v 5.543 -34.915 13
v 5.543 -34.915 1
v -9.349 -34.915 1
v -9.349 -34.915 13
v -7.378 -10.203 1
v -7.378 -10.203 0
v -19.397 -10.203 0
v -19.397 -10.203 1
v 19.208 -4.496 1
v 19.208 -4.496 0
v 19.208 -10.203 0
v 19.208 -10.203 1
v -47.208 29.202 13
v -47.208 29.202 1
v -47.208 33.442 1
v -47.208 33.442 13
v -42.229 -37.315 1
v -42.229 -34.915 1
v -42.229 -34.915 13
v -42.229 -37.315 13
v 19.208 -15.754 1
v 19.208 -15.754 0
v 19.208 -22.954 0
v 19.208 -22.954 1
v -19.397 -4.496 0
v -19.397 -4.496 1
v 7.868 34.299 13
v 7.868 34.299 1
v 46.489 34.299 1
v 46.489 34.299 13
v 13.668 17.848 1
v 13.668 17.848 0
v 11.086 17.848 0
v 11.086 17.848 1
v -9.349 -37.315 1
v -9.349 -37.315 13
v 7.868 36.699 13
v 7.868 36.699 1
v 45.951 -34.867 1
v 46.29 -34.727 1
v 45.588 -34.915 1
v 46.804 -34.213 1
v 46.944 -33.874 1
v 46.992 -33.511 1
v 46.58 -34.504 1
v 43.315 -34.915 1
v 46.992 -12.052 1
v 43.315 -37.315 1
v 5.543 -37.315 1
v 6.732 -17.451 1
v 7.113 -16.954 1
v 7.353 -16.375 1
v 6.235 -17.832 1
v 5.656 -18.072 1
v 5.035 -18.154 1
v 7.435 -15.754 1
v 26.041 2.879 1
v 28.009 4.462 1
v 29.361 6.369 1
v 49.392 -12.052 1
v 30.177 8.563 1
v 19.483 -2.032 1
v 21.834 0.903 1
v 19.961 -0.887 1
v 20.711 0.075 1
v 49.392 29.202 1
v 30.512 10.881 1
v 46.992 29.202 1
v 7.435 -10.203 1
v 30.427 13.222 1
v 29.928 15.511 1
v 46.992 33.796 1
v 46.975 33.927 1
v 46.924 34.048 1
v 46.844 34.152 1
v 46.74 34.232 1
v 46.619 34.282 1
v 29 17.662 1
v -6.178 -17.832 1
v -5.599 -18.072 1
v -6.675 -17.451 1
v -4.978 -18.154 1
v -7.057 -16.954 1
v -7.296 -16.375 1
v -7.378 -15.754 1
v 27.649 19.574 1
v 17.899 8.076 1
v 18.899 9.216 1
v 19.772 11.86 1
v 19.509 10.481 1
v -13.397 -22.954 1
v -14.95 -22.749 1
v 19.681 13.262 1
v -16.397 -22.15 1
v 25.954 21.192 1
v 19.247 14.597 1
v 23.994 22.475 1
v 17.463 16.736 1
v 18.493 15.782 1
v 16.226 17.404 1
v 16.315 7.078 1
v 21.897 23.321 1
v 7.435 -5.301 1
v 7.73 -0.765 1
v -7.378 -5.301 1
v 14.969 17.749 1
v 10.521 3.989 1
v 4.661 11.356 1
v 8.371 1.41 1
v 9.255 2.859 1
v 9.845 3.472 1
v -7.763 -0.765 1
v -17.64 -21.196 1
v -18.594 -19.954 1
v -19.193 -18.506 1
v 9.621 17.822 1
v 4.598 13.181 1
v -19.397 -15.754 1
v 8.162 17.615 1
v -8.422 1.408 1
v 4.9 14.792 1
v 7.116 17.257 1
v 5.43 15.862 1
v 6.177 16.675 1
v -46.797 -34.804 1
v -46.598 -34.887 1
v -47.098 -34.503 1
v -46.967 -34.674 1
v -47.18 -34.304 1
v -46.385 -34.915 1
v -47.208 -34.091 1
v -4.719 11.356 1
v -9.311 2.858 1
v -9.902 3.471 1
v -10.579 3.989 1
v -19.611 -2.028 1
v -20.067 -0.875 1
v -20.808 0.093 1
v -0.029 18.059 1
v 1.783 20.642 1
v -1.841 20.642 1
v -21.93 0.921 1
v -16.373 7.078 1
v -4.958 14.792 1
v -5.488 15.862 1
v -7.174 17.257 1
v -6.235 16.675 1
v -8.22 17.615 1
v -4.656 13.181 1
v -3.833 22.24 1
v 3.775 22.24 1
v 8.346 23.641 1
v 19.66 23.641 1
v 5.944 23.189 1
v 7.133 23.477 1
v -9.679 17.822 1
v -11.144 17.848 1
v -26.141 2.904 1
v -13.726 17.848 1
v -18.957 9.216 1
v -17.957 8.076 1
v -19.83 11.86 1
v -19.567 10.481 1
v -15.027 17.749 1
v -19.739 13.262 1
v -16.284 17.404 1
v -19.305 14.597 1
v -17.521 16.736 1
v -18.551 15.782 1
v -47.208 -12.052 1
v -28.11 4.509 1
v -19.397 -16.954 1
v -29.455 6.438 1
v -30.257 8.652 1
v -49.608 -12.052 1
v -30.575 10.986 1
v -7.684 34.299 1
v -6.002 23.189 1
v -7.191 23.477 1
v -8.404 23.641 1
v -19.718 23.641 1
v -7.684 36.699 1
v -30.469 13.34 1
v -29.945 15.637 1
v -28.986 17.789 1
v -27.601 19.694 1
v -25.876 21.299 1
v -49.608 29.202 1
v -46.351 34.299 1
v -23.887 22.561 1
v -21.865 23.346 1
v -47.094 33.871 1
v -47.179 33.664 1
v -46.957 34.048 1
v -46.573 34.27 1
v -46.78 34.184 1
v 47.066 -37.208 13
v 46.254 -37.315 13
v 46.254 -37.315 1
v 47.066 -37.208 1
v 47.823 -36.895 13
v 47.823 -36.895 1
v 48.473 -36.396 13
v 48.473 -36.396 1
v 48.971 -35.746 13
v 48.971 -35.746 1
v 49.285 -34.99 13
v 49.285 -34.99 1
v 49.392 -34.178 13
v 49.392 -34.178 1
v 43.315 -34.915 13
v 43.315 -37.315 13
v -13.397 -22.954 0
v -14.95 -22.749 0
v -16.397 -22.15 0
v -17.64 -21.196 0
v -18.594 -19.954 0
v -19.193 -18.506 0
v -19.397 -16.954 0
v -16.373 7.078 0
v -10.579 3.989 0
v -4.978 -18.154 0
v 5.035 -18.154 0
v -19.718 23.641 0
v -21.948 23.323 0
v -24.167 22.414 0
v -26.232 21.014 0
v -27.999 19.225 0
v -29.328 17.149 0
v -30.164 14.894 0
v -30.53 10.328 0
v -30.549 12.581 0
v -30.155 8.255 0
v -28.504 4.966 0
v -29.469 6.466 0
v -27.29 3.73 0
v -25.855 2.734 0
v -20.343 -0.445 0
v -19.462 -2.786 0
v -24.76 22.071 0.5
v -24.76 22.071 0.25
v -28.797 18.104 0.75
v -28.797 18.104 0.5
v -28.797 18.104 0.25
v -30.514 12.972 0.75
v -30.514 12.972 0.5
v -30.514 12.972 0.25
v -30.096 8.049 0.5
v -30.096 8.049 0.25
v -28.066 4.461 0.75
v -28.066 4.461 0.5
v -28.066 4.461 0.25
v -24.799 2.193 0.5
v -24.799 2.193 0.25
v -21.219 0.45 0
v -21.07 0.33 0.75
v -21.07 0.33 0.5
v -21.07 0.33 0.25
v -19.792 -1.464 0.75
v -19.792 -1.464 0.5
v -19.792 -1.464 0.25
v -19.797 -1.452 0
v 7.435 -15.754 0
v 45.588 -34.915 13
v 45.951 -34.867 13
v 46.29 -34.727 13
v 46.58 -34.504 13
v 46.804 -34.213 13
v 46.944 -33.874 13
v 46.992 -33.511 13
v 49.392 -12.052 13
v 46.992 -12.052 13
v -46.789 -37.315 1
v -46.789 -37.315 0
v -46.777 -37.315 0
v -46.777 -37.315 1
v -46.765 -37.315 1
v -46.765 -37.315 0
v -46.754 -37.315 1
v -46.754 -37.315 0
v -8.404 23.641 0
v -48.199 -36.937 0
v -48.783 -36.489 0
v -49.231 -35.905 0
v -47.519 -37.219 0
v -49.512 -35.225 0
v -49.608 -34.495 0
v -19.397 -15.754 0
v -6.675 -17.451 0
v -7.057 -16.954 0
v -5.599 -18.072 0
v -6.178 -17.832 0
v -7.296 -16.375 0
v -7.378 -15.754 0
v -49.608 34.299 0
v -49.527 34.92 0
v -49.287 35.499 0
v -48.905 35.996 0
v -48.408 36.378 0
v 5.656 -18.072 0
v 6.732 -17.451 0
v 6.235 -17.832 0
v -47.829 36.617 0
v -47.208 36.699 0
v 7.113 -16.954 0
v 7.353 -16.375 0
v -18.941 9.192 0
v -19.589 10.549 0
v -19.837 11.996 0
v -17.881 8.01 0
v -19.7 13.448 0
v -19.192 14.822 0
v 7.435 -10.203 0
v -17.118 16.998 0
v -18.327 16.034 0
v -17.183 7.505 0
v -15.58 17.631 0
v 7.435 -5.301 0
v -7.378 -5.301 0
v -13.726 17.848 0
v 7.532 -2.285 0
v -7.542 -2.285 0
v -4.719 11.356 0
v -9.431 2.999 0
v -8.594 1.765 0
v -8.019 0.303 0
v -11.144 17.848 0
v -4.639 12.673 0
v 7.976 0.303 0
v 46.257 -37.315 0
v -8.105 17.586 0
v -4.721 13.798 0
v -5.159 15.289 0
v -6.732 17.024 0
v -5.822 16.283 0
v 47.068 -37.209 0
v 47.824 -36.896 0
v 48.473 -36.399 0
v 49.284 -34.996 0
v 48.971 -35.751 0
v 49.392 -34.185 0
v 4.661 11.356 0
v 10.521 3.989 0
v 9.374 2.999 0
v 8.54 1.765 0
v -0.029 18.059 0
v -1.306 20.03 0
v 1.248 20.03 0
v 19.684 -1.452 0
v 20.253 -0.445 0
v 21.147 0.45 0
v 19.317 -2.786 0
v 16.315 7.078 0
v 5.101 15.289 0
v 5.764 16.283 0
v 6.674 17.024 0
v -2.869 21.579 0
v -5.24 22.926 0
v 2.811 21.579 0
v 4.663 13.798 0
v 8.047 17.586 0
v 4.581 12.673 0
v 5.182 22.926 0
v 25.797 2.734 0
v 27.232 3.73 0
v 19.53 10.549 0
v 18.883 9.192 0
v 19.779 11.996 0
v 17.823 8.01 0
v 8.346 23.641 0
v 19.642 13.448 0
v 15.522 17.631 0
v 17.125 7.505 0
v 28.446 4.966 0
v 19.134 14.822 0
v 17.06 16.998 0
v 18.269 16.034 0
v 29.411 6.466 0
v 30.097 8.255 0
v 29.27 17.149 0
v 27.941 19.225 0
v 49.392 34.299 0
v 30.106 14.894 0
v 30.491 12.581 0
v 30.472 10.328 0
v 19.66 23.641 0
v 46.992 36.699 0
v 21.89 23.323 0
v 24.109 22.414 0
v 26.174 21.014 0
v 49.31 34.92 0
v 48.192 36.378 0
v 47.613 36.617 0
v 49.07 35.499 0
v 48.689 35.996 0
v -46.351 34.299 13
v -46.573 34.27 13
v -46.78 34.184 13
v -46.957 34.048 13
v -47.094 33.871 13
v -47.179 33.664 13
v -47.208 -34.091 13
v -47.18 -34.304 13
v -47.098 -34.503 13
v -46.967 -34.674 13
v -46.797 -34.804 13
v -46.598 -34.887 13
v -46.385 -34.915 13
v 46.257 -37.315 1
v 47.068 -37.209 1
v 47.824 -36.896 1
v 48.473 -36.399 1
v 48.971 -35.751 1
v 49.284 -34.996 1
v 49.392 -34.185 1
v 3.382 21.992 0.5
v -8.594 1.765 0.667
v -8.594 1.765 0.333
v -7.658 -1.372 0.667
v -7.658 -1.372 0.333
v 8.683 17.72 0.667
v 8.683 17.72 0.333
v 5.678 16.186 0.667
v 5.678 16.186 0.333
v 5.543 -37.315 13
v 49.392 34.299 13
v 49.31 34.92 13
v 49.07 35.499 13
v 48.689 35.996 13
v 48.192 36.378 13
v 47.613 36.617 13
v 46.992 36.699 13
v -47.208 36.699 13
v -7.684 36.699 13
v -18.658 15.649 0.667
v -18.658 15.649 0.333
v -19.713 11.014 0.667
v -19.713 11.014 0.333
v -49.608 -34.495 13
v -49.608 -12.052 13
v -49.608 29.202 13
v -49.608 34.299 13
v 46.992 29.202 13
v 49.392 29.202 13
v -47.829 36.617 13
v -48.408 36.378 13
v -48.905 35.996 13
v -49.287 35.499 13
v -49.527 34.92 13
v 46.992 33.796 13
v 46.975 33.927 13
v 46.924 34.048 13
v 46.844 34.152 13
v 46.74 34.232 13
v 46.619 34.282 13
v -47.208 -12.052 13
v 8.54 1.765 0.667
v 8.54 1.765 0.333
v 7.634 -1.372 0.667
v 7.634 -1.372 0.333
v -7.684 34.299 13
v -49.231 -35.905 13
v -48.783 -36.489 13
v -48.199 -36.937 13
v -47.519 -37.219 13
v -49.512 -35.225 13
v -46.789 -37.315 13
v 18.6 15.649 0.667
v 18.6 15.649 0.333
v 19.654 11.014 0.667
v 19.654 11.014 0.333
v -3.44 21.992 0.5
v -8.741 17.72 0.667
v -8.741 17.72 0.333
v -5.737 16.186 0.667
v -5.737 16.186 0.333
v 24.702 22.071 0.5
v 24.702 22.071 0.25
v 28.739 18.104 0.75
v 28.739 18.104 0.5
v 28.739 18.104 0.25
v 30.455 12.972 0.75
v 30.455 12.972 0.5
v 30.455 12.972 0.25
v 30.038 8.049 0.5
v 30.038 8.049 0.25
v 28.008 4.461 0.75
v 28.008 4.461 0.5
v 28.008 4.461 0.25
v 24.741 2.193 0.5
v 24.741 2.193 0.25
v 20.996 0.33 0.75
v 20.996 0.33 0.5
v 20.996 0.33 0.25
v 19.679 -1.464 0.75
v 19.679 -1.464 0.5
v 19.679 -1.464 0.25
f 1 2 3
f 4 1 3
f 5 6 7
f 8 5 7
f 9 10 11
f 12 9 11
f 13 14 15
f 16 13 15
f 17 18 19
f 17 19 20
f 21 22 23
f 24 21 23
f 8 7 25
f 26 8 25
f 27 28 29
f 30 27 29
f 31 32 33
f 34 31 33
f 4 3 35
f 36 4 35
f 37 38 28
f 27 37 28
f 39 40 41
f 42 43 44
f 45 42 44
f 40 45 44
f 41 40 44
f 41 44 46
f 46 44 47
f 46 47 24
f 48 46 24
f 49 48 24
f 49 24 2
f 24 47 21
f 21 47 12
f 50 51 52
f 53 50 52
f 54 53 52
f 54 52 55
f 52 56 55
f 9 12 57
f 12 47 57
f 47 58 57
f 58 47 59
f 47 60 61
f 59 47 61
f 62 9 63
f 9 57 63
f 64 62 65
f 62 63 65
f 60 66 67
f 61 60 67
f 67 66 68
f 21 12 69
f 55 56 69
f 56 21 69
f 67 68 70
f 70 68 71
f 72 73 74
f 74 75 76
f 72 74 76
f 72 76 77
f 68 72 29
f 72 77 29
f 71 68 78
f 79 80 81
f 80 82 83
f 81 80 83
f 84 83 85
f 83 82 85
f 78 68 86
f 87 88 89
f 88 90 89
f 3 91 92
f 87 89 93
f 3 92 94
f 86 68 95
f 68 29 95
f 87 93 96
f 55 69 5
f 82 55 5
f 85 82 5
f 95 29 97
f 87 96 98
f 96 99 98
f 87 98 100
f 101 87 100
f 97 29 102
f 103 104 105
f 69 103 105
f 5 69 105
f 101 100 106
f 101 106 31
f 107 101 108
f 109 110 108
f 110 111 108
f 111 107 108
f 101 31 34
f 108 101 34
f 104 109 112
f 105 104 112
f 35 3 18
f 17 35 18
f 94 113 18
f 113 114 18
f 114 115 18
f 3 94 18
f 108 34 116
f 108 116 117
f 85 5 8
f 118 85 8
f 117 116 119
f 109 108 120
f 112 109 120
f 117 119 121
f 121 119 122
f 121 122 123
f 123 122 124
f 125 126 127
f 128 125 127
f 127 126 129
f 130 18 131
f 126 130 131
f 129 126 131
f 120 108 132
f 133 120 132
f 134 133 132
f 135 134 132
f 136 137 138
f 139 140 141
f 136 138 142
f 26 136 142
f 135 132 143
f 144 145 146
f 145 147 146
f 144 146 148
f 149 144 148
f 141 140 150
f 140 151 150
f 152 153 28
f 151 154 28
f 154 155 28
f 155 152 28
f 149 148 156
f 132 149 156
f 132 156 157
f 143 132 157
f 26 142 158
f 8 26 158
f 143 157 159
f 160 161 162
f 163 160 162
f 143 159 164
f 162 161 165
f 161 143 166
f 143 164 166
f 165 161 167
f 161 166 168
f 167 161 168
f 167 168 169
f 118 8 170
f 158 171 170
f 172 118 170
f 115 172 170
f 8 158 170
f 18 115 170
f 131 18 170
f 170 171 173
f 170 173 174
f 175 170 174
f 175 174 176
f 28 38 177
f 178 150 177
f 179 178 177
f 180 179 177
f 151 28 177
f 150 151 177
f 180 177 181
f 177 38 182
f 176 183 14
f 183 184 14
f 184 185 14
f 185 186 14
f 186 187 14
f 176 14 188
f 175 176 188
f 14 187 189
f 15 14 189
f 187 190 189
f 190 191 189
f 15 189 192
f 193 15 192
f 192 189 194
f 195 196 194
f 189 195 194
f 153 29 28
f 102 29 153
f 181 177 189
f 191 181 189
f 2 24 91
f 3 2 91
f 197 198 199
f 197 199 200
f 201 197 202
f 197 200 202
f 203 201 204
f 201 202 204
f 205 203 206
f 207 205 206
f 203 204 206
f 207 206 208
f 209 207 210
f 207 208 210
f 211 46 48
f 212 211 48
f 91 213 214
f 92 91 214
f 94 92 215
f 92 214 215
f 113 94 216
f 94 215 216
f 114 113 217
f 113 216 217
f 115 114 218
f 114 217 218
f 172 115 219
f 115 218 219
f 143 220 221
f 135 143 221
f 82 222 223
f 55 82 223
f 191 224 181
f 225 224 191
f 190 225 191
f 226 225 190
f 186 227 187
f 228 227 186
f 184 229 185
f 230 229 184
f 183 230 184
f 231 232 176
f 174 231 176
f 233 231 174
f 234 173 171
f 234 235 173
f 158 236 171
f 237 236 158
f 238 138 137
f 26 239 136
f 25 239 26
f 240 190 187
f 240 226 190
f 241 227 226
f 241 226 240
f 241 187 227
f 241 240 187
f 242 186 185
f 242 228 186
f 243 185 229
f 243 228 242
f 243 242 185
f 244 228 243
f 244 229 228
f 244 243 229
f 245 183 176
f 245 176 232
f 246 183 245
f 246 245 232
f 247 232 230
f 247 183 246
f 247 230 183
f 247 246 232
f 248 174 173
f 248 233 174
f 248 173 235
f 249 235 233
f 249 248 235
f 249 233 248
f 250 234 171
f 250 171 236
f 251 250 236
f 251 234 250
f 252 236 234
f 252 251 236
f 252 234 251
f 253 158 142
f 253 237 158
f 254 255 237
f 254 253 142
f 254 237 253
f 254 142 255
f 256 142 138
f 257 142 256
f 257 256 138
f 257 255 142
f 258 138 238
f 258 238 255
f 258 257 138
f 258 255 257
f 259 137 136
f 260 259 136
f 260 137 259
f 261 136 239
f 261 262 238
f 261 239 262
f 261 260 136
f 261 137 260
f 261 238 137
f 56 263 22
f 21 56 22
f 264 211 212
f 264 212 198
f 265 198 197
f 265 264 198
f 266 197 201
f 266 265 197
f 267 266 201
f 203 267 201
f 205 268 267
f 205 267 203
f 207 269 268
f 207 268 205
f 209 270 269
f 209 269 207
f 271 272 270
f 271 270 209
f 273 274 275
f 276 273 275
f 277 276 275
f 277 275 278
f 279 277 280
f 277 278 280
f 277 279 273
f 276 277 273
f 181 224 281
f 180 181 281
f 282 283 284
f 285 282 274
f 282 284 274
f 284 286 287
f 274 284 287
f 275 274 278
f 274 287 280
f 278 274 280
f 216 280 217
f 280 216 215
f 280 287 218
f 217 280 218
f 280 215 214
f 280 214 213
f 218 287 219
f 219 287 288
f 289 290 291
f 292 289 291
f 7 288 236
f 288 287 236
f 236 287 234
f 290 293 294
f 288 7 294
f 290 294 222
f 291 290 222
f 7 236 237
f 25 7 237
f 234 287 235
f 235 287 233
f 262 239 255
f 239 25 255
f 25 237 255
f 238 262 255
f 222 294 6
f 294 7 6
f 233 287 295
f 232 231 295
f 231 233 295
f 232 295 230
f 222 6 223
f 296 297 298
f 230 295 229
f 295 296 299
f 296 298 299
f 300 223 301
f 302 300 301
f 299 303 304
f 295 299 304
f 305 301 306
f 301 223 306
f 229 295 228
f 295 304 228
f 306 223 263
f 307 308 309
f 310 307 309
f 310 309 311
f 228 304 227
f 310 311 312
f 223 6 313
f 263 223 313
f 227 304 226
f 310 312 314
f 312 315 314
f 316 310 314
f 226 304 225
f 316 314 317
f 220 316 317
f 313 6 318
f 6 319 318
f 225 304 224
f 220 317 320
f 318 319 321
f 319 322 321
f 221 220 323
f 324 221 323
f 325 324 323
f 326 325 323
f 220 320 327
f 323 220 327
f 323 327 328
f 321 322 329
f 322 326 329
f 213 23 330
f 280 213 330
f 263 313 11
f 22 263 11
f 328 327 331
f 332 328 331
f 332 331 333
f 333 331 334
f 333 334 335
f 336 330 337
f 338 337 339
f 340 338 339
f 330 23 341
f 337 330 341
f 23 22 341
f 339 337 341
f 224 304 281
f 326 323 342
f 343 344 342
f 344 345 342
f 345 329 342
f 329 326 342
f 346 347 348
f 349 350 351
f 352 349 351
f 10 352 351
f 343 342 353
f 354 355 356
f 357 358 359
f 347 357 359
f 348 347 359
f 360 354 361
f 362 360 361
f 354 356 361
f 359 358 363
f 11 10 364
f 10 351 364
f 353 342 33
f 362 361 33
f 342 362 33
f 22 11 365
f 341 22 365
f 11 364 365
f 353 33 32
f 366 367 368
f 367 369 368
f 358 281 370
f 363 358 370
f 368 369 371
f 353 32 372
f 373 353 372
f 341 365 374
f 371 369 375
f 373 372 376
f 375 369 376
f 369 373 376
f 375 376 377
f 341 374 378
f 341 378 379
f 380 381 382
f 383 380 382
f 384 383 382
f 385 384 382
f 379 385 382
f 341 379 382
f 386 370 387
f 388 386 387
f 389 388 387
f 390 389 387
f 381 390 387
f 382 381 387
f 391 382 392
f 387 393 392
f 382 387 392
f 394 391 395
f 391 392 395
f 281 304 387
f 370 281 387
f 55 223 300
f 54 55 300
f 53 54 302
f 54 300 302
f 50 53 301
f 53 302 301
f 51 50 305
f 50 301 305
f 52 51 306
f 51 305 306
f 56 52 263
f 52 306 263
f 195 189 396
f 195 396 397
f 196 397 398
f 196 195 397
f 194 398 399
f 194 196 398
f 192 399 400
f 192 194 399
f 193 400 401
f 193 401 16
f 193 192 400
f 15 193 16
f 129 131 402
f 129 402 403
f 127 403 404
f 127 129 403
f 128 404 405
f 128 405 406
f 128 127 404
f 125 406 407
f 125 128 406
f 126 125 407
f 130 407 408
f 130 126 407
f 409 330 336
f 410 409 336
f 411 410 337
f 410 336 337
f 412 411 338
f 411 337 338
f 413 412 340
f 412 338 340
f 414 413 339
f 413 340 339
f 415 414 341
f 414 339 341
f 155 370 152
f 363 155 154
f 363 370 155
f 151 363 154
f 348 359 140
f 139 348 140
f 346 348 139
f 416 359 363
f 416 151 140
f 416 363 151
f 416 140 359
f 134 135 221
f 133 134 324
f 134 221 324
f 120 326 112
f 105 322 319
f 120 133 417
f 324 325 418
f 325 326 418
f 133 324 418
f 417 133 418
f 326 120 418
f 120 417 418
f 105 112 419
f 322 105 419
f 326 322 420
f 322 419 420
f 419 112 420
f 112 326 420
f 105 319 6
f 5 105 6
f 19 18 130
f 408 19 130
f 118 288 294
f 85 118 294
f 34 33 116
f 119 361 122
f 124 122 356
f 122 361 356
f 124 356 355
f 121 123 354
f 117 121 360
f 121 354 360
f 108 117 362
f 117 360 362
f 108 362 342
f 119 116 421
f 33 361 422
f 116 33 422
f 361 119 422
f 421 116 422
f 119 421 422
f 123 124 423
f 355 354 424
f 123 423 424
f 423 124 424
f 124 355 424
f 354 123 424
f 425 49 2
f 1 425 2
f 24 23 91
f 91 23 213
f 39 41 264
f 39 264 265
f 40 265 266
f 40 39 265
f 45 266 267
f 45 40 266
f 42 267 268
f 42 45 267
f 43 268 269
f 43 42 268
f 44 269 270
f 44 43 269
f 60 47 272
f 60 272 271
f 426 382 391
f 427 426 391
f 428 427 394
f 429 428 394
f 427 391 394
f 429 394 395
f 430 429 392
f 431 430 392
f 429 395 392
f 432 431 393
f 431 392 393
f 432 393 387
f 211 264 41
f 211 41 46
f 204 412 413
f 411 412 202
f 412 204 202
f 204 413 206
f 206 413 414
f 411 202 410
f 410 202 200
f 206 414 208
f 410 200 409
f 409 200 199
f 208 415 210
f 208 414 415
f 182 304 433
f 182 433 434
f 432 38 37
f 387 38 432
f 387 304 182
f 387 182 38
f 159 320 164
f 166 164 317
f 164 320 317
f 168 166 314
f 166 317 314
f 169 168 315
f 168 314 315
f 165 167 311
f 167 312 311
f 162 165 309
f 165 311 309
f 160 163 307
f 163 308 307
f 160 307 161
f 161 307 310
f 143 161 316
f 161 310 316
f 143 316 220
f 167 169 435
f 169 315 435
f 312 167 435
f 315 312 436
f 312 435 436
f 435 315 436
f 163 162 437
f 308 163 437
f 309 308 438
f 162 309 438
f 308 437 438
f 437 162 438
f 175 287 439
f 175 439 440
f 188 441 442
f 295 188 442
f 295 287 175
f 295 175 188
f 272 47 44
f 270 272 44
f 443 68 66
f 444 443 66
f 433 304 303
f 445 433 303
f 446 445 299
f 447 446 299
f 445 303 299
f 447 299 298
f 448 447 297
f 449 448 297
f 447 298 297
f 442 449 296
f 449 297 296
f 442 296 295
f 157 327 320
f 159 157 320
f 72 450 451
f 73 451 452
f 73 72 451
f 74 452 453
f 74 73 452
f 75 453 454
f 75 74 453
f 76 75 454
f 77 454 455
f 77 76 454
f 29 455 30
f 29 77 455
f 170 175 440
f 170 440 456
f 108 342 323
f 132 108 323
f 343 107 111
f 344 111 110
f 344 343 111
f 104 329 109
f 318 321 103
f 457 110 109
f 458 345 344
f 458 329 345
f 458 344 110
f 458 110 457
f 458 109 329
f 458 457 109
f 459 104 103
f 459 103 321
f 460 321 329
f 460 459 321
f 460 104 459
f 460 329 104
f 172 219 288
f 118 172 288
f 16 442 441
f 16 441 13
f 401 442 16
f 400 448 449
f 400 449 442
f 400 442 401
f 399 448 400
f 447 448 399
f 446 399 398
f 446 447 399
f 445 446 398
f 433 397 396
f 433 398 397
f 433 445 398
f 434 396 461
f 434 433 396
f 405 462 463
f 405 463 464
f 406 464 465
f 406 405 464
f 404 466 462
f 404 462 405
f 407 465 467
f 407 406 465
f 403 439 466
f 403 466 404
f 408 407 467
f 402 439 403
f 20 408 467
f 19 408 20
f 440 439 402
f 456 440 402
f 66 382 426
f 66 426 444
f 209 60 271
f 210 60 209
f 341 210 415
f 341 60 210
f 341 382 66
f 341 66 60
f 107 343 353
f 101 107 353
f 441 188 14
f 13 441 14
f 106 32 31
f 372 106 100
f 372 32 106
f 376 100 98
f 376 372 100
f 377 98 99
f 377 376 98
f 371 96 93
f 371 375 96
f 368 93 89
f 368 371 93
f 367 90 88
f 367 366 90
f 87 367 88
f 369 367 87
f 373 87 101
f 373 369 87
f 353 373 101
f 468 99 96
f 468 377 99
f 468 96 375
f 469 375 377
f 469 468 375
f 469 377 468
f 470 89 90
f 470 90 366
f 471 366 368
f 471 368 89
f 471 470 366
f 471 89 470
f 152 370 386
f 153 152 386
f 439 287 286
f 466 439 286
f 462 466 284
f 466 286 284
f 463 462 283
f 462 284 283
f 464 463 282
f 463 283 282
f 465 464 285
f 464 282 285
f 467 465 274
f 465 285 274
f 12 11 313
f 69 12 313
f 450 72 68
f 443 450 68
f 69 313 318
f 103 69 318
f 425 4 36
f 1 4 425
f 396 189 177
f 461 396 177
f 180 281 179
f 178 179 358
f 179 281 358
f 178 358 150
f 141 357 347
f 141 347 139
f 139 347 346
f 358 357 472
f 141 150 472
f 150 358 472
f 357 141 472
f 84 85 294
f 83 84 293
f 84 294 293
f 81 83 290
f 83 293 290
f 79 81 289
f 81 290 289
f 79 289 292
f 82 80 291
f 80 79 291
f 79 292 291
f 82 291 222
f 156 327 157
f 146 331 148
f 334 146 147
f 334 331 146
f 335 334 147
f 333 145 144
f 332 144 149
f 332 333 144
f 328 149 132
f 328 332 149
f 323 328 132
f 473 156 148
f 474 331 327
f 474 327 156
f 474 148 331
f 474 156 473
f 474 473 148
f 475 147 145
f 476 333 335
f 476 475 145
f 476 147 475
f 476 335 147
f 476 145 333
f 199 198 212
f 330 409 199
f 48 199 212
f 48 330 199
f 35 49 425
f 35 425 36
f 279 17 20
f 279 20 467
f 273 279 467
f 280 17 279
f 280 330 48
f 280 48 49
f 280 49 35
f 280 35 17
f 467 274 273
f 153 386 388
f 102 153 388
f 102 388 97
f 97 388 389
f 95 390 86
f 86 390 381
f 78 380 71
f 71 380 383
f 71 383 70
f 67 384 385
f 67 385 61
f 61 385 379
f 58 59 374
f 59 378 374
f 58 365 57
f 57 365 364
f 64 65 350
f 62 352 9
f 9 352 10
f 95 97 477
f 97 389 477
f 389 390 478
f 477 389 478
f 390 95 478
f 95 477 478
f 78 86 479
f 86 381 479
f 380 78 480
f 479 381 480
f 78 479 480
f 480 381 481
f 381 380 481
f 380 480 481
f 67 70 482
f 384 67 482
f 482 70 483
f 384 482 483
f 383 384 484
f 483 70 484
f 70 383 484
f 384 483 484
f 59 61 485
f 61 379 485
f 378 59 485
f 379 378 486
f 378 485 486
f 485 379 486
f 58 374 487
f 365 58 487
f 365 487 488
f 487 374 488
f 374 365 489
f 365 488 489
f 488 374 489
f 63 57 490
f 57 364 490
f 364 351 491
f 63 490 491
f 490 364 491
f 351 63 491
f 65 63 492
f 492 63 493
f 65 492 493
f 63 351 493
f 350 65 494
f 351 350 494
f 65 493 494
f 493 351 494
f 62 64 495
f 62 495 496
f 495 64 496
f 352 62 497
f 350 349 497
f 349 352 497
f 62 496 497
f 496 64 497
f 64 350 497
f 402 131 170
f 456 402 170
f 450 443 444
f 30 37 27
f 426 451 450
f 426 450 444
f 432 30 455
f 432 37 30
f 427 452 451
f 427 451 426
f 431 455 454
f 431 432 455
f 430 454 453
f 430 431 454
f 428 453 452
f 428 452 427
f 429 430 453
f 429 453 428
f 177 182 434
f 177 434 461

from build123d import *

# Parameters (mm, degrees)
EXTRUDE001_DEPTH = 3
EXTRUDE_DEPTH    = 13
PAD_DEPTH        = 1


with BuildPart() as logo:
    # Clone001 → Extrude001 (new body)
    with BuildSketch(Plane(origin=(-0.02902, 0.352548, 0), x_dir=(0, 1, 0), z_dir=(0, 0, 1))):
        with BuildLine():
            Line((11.003952, 0), (11.003952, 4.6902))
            add(Edge.make_bspline(
                [(17.495532, 11.11494), (17.439852, 9.87498), (18.110958, 3.851298), (11.003952, 4.6902)],
                knots=[0, 0, 0, 0, 1, 1, 1, 1], degree=3))
            Line((17.495532, 11.11494), (17.495532, 13.69728))
            add(Edge.make_bspline(
                [(17.495532, 13.69728), (17.55828, 20.39472), (9.268146, 22.052754), (6.725322, 16.344462)],
                knots=[0, 0, 0, 0, 1, 1, 1, 1], degree=3))
            Line((6.725322, 16.344462), (3.636072, 10.55046))
            add(Edge.make_bspline(
                [(3.636072, 10.55046), (1.910148, 7.910058), (-1.368966, 7.43109), (-5.653788, 7.349202)],
                knots=[0, 0, 0, 0, 1, 1, 1, 1], degree=3))
            Line((-5.653788, 7.349202), (-10.55505, 7.349202))
            Line((-10.55505, 7.349202), (-10.55505, 19.368439))
            Line((-10.55505, 19.368439), (-4.848108, 19.368439))
            add(Edge.make_bspline(
                [(23.288592, 19.68918), (23.306112, 23.010726), (18.553098, 30.563958), (6.6153, 31.116642), (1.16223, 25.36881), (0.241104, 19.141998), (-4.848108, 19.368439)],
                knots=[0, 0, 0, 0, 0.25, 0.5, 0.75, 1, 1, 1, 1], degree=3))
            Line((23.288592, 19.68918), (23.288592, 8.37522))
            add(Edge.make_bspline(
                [(23.288592, 8.37522), (22.78257, 2.635146), (17.706012, 0)],
                knots=[0, 0, 0, 1, 1, 1], degree=2))
            add(Edge.make_bspline(
                [(23.288592, -8.37522), (22.78257, -2.635146), (17.706012, 0)],
                knots=[0, 0, 0, 1, 1, 1], degree=2))
            Line((23.288592, -8.37522), (23.288592, -19.68918))
            add(Edge.make_bspline(
                [(23.288592, -19.68918), (23.306112, -23.010726), (18.553098, -30.563958), (6.6153, -31.116642), (1.16223, -25.36881), (0.241104, -19.141998), (-4.848108, -19.23738)],
                knots=[0, 0, 0, 0, 0.25, 0.5, 0.75, 1, 1, 1, 1], degree=3))
            Line((-4.848108, -19.23738), (-10.55505, -19.23738))
            Line((-10.55505, -19.23738), (-10.55505, -7.463955))
            Line((-10.55505, -7.463955), (-5.653788, -7.463955))
            add(Edge.make_bspline(
                [(3.636072, -10.55046), (1.910148, -7.910058), (-1.368966, -7.43109), (-5.653788, -7.463955)],
                knots=[0, 0, 0, 0, 1, 1, 1, 1], degree=3))
            Line((3.636072, -10.55046), (6.725322, -16.344462))
            add(Edge.make_bspline(
                [(17.495532, -13.69728), (17.55828, -20.39472), (9.268146, -22.052754), (6.725322, -16.344462)],
                knots=[0, 0, 0, 0, 1, 1, 1, 1], degree=3))
            Line((17.495532, -13.69728), (17.495532, -11.11494))
            add(Edge.make_bspline(
                [(17.495532, -11.11494), (17.439852, -9.87498), (18.110958, -3.851298), (11.003952, -4.6902)],
                knots=[0, 0, 0, 0, 1, 1, 1, 1], degree=3))
            Line((11.003952, -4.6902), (11.003952, 0))
        make_face()
        with BuildLine():
            Line((-17.306112, 19.368439), (-16.106112, 19.368439))
            Line((-16.106112, 19.368439), (-16.106112, 7.349202))
            ThreePointArc((-16.106112, 7.349202), (-17.803168, 6.646258), (-18.506112, 4.949202))
            Line((-18.506112, 4.949202), (-18.506112, -5.063955))
            ThreePointArc((-18.506112, -5.063955), (-17.803168, -6.761011), (-16.106112, -7.463955))
            Line((-16.106112, -7.463955), (-16.106112, -19.23738))
            Line((-16.106112, -19.23738), (-23.306112, -19.23738))
            Line((-23.306112, -19.23738), (-23.306112, 13.368439))
            ThreePointArc((-23.306112, 13.368439), (-21.548753, 17.61108), (-17.306112, 19.368439))
        make_face()
    extrude(amount=EXTRUDE001_DEPTH)


with BuildPart() as basewall:
    # Sketch002 → Extrude (new body)
    with BuildSketch(Plane.XY):
        with BuildLine():
            Line((-46.351255, 34.299068), (-7.683758, 34.299068))
            Line((-7.683758, 36.699068), (-7.683758, 34.299068))
            Line((-47.208331, 36.699068), (-7.683758, 36.699068))
            ThreePointArc((-47.208331, 36.699068), (-48.905387, 35.996124), (-49.608331, 34.299068))
            Line((-49.608331, 29.202455), (-49.608331, 34.299068))
            Line((-49.608331, 29.202455), (-47.208331, 29.202455))
            Line((-47.208331, 29.202455), (-47.208331, 33.441992))
            ThreePointArc((-46.351255, 34.299068), (-46.957299, 34.048036), (-47.208331, 33.441992))
        make_face()
        with BuildLine():
            Line((46.991669, 33.796452), (46.991669, 29.202455))
            Line((46.991669, 29.202455), (49.391669, 29.202455))
            Line((49.391669, 34.299068), (49.391669, 29.202455))
            ThreePointArc((49.391669, 34.299068), (48.688725, 35.996124), (46.991669, 36.699068))
            Line((7.867758, 36.699068), (46.991669, 36.699068))
            Line((7.867758, 36.699068), (7.867758, 34.299068))
            Line((7.867758, 34.299068), (46.489053, 34.299068))
            ThreePointArc((46.991669, 33.796452), (46.844456, 34.151855), (46.489053, 34.299068))
        make_face()
        with BuildLine():
            Line((45.587676, -34.914826), (43.315151, -34.914826))
            Line((43.315151, -34.914826), (43.315152, -37.314826))
            Line((46.254463, -37.314826), (43.315152, -37.314826))
            ThreePointArc((46.254463, -37.314826), (48.472803, -36.395959), (49.391669, -34.177619))
            Line((49.391669, -12.051777), (49.391669, -34.177619))
            Line((46.991669, -12.051777), (49.391669, -12.051777))
            Line((46.991669, -12.051777), (46.991669, -33.510833))
            ThreePointArc((45.587676, -34.914826), (46.580449, -34.503606), (46.991669, -33.510833))
        make_face()
        with BuildLine():
            Line((-47.208331, -34.091189), (-47.208331, -12.051777))
            Line((-49.608331, -12.051777), (-47.208331, -12.051777))
            Line((-49.608331, -34.495377), (-49.608331, -12.051777))
            ThreePointArc((-49.608331, -34.495377), (-48.782534, -36.489028), (-46.788882, -37.314826))
            Line((-42.228662, -37.314826), (-46.788882, -37.314826))
            Line((-42.228662, -34.914826), (-42.228662, -37.314826))
            Line((-42.228662, -34.914826), (-46.384694, -34.914826))
            ThreePointArc((-47.208331, -34.091189), (-46.967093, -34.673588), (-46.384694, -34.914826))
        make_face()
        Polygon((-9.348882, -34.914826), (-9.348882, -37.314826), (5.543215, -37.314826), (5.543216, -34.914826), align=None)
    extrude(amount=EXTRUDE_DEPTH)


with BuildPart() as brandedbase:
    # Sketch → Pad (new body)
    with BuildSketch(Plane.XY):
        with BuildLine():
            Line((-47.208331, 36.699068), (46.991669, 36.699068))
            ThreePointArc((49.391669, 34.299068), (48.688725, 35.996124), (46.991669, 36.699068))
            Line((49.391669, 34.299068), (49.391669, -34.185399))
            ThreePointArc((46.257494, -37.314826), (48.472707, -36.399221), (49.391669, -34.185399))
            Line((46.257494, -37.314826), (-46.753742, -37.314826))
            ThreePointArc((-49.608331, -34.495164), (-48.765008, -36.4962), (-46.753742, -37.314826))
            Line((-49.608331, -34.495164), (-49.608331, 34.299068))
            ThreePointArc((-47.208331, 36.699068), (-48.905387, 35.996124), (-49.608331, 34.299068))
        make_face()
    extrude(amount=PAD_DEPTH)

    # Fusion: union BaseWall
    add(basewall.part)

    # Cut: cut Logo
    add(logo.part, mode=Mode.SUBTRACT)


solid = brandedbase.part
